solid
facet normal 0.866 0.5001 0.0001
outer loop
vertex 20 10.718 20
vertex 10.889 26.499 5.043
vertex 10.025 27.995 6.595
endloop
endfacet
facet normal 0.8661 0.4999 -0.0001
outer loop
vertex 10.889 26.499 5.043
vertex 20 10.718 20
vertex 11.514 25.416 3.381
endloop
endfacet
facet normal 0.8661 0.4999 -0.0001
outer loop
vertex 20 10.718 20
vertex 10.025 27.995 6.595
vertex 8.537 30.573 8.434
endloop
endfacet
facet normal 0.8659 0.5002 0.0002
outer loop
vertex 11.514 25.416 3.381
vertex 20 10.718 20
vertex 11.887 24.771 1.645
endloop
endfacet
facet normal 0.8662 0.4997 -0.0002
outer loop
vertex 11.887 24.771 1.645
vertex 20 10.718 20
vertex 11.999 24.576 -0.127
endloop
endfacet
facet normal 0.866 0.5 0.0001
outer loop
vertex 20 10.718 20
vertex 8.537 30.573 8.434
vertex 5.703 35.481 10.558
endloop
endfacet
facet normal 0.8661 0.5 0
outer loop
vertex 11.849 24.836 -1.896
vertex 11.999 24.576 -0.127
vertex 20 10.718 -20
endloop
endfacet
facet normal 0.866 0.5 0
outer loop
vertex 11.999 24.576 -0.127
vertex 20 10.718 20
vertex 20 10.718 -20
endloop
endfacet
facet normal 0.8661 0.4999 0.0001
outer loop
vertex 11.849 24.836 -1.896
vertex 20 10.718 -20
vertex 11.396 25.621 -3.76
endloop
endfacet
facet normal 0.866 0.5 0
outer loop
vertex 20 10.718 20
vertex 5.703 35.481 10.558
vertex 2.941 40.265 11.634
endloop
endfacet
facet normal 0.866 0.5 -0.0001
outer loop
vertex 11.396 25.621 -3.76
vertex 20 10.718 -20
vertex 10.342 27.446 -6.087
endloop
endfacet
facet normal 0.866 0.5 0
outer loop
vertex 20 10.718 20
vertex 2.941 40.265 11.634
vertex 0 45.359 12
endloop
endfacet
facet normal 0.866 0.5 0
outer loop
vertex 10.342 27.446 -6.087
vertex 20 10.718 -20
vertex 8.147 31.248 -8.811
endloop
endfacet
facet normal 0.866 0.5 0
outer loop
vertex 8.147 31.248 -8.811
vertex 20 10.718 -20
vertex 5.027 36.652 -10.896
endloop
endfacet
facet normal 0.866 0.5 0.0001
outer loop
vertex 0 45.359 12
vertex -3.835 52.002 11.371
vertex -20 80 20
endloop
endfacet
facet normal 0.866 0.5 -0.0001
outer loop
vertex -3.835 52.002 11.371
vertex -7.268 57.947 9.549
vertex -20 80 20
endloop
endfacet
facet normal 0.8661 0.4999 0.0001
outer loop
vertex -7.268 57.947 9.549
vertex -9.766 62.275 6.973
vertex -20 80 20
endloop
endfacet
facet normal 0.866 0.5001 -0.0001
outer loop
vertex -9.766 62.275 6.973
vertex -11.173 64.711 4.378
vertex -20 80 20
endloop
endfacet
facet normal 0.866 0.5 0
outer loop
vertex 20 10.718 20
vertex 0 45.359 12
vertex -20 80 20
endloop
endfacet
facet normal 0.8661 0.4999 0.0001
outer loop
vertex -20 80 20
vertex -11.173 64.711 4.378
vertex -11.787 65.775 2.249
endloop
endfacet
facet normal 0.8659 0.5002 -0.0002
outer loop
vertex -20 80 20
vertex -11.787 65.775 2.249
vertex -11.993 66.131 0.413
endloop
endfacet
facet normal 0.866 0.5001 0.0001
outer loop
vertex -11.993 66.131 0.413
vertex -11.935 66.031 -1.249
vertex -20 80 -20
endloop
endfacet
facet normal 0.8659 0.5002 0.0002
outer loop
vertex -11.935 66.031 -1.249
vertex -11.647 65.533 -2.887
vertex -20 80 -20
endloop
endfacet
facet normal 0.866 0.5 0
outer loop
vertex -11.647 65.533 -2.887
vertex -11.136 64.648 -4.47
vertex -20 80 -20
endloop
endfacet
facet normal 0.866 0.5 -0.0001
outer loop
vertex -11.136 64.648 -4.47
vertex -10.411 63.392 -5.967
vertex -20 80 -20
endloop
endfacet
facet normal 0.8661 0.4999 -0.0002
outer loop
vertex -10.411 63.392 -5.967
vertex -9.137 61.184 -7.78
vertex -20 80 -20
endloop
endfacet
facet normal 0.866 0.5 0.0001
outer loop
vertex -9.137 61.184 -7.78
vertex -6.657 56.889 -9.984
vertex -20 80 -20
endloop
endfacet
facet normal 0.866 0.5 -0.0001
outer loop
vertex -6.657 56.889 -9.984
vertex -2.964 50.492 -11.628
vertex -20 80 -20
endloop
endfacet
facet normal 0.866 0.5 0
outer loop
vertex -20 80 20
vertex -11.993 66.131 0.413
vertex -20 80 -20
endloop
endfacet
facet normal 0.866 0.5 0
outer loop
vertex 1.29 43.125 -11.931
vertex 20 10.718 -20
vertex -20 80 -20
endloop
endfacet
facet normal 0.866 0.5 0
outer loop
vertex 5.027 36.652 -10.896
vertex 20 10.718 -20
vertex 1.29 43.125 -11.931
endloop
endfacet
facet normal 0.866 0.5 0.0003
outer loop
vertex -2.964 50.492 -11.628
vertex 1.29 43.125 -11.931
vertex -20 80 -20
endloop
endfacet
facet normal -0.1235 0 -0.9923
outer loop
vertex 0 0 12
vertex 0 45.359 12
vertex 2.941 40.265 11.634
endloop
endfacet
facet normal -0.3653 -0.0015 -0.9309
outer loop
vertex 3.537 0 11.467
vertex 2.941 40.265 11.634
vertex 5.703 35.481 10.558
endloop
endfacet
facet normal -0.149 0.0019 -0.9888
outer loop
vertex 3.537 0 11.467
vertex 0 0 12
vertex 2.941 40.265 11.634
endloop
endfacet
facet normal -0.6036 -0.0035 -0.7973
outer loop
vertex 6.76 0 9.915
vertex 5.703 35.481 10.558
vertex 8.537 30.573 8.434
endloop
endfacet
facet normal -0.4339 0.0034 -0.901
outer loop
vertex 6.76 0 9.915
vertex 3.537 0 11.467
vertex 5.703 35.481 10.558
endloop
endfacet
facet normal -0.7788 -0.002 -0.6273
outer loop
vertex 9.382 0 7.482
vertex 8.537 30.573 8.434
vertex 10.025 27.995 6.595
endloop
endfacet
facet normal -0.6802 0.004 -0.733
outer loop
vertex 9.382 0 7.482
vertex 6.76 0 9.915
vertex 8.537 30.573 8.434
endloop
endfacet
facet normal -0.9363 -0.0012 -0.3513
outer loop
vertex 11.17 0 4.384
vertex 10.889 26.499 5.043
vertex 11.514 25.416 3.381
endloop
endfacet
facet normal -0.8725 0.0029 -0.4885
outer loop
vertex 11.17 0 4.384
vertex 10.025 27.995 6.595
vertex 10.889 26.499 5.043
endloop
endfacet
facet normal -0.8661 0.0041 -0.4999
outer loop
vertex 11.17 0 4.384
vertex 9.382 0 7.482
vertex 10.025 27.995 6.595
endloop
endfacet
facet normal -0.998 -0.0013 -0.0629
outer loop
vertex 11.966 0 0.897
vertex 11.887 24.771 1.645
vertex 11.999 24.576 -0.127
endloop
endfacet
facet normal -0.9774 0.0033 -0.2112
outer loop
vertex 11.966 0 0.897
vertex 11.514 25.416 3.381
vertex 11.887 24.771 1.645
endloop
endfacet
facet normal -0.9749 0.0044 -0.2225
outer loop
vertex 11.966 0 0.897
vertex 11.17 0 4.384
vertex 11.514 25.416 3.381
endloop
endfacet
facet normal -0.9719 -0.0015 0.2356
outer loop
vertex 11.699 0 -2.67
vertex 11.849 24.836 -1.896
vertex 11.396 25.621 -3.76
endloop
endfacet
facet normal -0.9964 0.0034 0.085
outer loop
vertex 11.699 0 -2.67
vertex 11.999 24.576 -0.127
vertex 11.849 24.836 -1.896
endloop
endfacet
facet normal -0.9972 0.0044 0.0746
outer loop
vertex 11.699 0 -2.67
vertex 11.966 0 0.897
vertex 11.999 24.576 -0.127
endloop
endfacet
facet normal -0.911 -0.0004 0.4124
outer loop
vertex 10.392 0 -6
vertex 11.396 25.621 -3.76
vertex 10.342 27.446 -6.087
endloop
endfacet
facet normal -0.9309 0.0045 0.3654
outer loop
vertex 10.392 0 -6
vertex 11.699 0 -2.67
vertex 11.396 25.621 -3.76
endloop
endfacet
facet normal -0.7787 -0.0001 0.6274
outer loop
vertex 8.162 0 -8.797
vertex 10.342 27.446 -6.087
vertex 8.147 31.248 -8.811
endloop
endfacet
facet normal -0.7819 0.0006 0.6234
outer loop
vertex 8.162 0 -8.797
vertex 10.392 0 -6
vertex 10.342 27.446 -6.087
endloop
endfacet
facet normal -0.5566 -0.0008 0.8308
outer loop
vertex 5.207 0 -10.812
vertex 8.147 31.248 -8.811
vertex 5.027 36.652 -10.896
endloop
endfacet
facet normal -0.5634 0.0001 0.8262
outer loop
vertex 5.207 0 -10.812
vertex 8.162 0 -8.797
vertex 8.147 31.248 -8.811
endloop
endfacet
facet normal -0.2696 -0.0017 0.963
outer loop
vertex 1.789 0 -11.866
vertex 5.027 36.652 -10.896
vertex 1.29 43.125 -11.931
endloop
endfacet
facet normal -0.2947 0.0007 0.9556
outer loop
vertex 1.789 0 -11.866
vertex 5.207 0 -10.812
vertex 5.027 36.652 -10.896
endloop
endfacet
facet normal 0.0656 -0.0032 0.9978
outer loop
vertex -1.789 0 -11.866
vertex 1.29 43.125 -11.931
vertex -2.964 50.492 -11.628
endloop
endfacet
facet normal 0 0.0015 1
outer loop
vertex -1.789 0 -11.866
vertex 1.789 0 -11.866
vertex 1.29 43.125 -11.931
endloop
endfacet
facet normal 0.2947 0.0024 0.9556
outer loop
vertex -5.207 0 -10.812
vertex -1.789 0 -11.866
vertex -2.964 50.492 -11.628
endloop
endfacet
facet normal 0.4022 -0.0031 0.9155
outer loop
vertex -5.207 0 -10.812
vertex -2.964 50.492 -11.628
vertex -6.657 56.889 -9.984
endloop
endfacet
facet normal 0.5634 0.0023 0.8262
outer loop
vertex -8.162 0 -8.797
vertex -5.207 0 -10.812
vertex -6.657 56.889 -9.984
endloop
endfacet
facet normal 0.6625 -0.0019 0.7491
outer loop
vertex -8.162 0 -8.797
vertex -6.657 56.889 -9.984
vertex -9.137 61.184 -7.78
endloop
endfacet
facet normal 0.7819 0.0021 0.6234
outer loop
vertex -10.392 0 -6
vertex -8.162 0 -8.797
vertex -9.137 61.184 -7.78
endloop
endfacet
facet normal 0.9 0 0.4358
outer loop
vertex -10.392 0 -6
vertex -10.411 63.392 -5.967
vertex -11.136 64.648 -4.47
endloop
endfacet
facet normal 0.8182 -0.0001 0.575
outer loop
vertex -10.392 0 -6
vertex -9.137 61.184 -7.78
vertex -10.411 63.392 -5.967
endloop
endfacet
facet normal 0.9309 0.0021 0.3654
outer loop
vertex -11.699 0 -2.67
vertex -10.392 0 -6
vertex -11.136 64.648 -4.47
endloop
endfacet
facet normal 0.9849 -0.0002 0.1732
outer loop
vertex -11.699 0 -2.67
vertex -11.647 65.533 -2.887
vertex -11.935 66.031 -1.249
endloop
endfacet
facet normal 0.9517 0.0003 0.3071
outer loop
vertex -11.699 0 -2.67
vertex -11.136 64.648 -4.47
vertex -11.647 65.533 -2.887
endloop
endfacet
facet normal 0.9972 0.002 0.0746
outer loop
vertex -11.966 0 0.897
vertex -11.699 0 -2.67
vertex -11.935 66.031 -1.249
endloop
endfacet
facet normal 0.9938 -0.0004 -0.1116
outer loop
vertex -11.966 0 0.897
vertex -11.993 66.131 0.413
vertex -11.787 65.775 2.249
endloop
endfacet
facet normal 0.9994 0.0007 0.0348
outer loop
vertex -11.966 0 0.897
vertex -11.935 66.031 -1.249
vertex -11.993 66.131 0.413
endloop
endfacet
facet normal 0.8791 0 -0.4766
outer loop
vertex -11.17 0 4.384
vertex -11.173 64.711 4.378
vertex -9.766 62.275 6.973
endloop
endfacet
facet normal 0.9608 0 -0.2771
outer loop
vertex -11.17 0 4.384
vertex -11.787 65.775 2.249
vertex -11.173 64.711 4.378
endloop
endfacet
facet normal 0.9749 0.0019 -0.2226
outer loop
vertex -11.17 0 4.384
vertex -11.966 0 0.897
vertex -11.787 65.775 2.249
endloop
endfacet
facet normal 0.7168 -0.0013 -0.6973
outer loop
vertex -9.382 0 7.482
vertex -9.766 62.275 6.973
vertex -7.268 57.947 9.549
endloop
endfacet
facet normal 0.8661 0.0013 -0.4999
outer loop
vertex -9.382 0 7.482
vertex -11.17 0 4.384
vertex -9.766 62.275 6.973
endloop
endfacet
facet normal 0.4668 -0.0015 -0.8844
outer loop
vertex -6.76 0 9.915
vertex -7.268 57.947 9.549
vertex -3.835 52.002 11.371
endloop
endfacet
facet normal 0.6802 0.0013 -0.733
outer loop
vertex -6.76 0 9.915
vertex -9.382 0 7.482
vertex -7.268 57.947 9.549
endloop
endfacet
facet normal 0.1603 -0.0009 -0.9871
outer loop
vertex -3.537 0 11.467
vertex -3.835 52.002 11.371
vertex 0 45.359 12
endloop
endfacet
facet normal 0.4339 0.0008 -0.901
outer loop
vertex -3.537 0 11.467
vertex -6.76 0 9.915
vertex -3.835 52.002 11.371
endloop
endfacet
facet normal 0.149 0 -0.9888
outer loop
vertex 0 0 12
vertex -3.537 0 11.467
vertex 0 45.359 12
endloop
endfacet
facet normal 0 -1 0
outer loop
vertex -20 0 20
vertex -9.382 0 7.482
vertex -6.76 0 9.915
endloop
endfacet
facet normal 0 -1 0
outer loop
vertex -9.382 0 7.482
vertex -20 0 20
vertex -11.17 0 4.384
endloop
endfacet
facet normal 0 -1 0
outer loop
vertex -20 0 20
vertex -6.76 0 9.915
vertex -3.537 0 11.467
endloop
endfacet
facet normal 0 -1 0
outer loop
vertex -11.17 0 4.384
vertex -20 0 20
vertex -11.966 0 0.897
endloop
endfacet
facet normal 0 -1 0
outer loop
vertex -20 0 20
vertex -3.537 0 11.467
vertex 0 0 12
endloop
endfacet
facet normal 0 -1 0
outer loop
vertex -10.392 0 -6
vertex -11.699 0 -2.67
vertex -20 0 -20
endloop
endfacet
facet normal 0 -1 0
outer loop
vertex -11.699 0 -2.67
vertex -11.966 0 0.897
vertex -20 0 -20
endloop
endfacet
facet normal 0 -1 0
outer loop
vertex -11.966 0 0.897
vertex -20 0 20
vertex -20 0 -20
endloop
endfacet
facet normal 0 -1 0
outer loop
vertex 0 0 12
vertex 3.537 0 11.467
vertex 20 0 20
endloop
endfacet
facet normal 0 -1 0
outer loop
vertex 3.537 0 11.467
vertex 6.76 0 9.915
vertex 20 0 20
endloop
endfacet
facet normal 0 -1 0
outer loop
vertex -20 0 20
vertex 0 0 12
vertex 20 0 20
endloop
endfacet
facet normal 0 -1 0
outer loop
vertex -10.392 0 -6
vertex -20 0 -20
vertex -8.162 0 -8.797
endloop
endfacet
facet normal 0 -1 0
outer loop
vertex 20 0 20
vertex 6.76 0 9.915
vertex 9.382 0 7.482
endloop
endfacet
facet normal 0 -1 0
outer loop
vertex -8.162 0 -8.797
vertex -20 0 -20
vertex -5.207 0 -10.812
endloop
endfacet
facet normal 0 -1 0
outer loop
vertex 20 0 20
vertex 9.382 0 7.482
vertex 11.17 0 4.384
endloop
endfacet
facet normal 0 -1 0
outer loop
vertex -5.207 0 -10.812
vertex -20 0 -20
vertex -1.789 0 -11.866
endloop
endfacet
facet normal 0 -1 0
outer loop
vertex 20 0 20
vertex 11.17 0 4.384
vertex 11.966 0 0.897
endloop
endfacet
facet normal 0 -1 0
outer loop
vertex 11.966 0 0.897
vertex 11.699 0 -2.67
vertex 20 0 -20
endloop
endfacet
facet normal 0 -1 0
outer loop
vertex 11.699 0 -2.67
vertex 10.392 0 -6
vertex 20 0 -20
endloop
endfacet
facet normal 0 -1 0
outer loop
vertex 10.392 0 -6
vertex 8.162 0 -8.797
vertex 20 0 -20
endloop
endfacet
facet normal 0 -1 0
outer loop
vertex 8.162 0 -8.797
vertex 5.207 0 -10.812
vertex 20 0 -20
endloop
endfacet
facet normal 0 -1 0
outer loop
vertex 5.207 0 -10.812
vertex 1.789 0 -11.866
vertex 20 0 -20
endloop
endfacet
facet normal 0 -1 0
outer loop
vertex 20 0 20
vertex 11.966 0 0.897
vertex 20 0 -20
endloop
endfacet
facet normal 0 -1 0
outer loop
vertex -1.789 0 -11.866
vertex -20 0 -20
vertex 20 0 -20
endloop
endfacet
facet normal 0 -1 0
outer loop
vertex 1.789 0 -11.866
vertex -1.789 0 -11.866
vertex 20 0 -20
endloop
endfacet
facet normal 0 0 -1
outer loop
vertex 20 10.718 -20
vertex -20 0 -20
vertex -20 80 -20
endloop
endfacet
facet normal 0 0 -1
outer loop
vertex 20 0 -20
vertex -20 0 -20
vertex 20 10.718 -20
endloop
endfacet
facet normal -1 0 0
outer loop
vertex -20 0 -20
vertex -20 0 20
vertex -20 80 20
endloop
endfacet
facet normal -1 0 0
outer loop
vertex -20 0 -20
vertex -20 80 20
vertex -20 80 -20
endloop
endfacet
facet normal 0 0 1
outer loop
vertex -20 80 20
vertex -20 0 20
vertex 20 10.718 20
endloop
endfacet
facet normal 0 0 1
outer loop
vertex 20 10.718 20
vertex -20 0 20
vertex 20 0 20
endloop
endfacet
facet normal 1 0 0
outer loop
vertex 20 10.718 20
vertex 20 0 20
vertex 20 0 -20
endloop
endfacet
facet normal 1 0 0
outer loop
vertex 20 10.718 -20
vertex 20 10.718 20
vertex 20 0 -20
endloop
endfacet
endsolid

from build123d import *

# Parameters (mm, degrees)
SKETCH_1_W               = 40
SKETCH_1_H               = 40
SKETCH_1_R               = 12
EXTRUDE_1_DEPTH          = 80
CUT_EXTRUDE_2_DEPTH      = 85.852813742
CUT_EXTRUDE_2_DEPTH_BACK = 85.852813742


with BuildPart() as part:
    # 草圖1 → 填料-伸長1 (new body)
    with BuildSketch(Plane(origin=(0, 0, 0), x_dir=(1, 0, 0), z_dir=(0, 1, 0))):
        Rectangle(SKETCH_1_W, SKETCH_1_H)
        with Locations(Location((0, 0, 0), (0, 0, 270))):
            Circle(SKETCH_1_R, mode=Mode.SUBTRACT)
    extrude(amount=EXTRUDE_1_DEPTH)

    # 草圖2 → 除料-伸長2 (cut, two sides: drawn at the far end of the back side and taken through both)
    with BuildSketch(Plane.XY.offset(-CUT_EXTRUDE_2_DEPTH_BACK)):
        Polygon((114.4427191, -152.861620189), (20, 10.717967697), (-20, 80), (-114.4427191, 243.579587886), (212.716456672, 432.465026086), (441.601894872, 36.023818011), align=None)
    extrude(amount=CUT_EXTRUDE_2_DEPTH + CUT_EXTRUDE_2_DEPTH_BACK, mode=Mode.SUBTRACT)


solid = part.part
